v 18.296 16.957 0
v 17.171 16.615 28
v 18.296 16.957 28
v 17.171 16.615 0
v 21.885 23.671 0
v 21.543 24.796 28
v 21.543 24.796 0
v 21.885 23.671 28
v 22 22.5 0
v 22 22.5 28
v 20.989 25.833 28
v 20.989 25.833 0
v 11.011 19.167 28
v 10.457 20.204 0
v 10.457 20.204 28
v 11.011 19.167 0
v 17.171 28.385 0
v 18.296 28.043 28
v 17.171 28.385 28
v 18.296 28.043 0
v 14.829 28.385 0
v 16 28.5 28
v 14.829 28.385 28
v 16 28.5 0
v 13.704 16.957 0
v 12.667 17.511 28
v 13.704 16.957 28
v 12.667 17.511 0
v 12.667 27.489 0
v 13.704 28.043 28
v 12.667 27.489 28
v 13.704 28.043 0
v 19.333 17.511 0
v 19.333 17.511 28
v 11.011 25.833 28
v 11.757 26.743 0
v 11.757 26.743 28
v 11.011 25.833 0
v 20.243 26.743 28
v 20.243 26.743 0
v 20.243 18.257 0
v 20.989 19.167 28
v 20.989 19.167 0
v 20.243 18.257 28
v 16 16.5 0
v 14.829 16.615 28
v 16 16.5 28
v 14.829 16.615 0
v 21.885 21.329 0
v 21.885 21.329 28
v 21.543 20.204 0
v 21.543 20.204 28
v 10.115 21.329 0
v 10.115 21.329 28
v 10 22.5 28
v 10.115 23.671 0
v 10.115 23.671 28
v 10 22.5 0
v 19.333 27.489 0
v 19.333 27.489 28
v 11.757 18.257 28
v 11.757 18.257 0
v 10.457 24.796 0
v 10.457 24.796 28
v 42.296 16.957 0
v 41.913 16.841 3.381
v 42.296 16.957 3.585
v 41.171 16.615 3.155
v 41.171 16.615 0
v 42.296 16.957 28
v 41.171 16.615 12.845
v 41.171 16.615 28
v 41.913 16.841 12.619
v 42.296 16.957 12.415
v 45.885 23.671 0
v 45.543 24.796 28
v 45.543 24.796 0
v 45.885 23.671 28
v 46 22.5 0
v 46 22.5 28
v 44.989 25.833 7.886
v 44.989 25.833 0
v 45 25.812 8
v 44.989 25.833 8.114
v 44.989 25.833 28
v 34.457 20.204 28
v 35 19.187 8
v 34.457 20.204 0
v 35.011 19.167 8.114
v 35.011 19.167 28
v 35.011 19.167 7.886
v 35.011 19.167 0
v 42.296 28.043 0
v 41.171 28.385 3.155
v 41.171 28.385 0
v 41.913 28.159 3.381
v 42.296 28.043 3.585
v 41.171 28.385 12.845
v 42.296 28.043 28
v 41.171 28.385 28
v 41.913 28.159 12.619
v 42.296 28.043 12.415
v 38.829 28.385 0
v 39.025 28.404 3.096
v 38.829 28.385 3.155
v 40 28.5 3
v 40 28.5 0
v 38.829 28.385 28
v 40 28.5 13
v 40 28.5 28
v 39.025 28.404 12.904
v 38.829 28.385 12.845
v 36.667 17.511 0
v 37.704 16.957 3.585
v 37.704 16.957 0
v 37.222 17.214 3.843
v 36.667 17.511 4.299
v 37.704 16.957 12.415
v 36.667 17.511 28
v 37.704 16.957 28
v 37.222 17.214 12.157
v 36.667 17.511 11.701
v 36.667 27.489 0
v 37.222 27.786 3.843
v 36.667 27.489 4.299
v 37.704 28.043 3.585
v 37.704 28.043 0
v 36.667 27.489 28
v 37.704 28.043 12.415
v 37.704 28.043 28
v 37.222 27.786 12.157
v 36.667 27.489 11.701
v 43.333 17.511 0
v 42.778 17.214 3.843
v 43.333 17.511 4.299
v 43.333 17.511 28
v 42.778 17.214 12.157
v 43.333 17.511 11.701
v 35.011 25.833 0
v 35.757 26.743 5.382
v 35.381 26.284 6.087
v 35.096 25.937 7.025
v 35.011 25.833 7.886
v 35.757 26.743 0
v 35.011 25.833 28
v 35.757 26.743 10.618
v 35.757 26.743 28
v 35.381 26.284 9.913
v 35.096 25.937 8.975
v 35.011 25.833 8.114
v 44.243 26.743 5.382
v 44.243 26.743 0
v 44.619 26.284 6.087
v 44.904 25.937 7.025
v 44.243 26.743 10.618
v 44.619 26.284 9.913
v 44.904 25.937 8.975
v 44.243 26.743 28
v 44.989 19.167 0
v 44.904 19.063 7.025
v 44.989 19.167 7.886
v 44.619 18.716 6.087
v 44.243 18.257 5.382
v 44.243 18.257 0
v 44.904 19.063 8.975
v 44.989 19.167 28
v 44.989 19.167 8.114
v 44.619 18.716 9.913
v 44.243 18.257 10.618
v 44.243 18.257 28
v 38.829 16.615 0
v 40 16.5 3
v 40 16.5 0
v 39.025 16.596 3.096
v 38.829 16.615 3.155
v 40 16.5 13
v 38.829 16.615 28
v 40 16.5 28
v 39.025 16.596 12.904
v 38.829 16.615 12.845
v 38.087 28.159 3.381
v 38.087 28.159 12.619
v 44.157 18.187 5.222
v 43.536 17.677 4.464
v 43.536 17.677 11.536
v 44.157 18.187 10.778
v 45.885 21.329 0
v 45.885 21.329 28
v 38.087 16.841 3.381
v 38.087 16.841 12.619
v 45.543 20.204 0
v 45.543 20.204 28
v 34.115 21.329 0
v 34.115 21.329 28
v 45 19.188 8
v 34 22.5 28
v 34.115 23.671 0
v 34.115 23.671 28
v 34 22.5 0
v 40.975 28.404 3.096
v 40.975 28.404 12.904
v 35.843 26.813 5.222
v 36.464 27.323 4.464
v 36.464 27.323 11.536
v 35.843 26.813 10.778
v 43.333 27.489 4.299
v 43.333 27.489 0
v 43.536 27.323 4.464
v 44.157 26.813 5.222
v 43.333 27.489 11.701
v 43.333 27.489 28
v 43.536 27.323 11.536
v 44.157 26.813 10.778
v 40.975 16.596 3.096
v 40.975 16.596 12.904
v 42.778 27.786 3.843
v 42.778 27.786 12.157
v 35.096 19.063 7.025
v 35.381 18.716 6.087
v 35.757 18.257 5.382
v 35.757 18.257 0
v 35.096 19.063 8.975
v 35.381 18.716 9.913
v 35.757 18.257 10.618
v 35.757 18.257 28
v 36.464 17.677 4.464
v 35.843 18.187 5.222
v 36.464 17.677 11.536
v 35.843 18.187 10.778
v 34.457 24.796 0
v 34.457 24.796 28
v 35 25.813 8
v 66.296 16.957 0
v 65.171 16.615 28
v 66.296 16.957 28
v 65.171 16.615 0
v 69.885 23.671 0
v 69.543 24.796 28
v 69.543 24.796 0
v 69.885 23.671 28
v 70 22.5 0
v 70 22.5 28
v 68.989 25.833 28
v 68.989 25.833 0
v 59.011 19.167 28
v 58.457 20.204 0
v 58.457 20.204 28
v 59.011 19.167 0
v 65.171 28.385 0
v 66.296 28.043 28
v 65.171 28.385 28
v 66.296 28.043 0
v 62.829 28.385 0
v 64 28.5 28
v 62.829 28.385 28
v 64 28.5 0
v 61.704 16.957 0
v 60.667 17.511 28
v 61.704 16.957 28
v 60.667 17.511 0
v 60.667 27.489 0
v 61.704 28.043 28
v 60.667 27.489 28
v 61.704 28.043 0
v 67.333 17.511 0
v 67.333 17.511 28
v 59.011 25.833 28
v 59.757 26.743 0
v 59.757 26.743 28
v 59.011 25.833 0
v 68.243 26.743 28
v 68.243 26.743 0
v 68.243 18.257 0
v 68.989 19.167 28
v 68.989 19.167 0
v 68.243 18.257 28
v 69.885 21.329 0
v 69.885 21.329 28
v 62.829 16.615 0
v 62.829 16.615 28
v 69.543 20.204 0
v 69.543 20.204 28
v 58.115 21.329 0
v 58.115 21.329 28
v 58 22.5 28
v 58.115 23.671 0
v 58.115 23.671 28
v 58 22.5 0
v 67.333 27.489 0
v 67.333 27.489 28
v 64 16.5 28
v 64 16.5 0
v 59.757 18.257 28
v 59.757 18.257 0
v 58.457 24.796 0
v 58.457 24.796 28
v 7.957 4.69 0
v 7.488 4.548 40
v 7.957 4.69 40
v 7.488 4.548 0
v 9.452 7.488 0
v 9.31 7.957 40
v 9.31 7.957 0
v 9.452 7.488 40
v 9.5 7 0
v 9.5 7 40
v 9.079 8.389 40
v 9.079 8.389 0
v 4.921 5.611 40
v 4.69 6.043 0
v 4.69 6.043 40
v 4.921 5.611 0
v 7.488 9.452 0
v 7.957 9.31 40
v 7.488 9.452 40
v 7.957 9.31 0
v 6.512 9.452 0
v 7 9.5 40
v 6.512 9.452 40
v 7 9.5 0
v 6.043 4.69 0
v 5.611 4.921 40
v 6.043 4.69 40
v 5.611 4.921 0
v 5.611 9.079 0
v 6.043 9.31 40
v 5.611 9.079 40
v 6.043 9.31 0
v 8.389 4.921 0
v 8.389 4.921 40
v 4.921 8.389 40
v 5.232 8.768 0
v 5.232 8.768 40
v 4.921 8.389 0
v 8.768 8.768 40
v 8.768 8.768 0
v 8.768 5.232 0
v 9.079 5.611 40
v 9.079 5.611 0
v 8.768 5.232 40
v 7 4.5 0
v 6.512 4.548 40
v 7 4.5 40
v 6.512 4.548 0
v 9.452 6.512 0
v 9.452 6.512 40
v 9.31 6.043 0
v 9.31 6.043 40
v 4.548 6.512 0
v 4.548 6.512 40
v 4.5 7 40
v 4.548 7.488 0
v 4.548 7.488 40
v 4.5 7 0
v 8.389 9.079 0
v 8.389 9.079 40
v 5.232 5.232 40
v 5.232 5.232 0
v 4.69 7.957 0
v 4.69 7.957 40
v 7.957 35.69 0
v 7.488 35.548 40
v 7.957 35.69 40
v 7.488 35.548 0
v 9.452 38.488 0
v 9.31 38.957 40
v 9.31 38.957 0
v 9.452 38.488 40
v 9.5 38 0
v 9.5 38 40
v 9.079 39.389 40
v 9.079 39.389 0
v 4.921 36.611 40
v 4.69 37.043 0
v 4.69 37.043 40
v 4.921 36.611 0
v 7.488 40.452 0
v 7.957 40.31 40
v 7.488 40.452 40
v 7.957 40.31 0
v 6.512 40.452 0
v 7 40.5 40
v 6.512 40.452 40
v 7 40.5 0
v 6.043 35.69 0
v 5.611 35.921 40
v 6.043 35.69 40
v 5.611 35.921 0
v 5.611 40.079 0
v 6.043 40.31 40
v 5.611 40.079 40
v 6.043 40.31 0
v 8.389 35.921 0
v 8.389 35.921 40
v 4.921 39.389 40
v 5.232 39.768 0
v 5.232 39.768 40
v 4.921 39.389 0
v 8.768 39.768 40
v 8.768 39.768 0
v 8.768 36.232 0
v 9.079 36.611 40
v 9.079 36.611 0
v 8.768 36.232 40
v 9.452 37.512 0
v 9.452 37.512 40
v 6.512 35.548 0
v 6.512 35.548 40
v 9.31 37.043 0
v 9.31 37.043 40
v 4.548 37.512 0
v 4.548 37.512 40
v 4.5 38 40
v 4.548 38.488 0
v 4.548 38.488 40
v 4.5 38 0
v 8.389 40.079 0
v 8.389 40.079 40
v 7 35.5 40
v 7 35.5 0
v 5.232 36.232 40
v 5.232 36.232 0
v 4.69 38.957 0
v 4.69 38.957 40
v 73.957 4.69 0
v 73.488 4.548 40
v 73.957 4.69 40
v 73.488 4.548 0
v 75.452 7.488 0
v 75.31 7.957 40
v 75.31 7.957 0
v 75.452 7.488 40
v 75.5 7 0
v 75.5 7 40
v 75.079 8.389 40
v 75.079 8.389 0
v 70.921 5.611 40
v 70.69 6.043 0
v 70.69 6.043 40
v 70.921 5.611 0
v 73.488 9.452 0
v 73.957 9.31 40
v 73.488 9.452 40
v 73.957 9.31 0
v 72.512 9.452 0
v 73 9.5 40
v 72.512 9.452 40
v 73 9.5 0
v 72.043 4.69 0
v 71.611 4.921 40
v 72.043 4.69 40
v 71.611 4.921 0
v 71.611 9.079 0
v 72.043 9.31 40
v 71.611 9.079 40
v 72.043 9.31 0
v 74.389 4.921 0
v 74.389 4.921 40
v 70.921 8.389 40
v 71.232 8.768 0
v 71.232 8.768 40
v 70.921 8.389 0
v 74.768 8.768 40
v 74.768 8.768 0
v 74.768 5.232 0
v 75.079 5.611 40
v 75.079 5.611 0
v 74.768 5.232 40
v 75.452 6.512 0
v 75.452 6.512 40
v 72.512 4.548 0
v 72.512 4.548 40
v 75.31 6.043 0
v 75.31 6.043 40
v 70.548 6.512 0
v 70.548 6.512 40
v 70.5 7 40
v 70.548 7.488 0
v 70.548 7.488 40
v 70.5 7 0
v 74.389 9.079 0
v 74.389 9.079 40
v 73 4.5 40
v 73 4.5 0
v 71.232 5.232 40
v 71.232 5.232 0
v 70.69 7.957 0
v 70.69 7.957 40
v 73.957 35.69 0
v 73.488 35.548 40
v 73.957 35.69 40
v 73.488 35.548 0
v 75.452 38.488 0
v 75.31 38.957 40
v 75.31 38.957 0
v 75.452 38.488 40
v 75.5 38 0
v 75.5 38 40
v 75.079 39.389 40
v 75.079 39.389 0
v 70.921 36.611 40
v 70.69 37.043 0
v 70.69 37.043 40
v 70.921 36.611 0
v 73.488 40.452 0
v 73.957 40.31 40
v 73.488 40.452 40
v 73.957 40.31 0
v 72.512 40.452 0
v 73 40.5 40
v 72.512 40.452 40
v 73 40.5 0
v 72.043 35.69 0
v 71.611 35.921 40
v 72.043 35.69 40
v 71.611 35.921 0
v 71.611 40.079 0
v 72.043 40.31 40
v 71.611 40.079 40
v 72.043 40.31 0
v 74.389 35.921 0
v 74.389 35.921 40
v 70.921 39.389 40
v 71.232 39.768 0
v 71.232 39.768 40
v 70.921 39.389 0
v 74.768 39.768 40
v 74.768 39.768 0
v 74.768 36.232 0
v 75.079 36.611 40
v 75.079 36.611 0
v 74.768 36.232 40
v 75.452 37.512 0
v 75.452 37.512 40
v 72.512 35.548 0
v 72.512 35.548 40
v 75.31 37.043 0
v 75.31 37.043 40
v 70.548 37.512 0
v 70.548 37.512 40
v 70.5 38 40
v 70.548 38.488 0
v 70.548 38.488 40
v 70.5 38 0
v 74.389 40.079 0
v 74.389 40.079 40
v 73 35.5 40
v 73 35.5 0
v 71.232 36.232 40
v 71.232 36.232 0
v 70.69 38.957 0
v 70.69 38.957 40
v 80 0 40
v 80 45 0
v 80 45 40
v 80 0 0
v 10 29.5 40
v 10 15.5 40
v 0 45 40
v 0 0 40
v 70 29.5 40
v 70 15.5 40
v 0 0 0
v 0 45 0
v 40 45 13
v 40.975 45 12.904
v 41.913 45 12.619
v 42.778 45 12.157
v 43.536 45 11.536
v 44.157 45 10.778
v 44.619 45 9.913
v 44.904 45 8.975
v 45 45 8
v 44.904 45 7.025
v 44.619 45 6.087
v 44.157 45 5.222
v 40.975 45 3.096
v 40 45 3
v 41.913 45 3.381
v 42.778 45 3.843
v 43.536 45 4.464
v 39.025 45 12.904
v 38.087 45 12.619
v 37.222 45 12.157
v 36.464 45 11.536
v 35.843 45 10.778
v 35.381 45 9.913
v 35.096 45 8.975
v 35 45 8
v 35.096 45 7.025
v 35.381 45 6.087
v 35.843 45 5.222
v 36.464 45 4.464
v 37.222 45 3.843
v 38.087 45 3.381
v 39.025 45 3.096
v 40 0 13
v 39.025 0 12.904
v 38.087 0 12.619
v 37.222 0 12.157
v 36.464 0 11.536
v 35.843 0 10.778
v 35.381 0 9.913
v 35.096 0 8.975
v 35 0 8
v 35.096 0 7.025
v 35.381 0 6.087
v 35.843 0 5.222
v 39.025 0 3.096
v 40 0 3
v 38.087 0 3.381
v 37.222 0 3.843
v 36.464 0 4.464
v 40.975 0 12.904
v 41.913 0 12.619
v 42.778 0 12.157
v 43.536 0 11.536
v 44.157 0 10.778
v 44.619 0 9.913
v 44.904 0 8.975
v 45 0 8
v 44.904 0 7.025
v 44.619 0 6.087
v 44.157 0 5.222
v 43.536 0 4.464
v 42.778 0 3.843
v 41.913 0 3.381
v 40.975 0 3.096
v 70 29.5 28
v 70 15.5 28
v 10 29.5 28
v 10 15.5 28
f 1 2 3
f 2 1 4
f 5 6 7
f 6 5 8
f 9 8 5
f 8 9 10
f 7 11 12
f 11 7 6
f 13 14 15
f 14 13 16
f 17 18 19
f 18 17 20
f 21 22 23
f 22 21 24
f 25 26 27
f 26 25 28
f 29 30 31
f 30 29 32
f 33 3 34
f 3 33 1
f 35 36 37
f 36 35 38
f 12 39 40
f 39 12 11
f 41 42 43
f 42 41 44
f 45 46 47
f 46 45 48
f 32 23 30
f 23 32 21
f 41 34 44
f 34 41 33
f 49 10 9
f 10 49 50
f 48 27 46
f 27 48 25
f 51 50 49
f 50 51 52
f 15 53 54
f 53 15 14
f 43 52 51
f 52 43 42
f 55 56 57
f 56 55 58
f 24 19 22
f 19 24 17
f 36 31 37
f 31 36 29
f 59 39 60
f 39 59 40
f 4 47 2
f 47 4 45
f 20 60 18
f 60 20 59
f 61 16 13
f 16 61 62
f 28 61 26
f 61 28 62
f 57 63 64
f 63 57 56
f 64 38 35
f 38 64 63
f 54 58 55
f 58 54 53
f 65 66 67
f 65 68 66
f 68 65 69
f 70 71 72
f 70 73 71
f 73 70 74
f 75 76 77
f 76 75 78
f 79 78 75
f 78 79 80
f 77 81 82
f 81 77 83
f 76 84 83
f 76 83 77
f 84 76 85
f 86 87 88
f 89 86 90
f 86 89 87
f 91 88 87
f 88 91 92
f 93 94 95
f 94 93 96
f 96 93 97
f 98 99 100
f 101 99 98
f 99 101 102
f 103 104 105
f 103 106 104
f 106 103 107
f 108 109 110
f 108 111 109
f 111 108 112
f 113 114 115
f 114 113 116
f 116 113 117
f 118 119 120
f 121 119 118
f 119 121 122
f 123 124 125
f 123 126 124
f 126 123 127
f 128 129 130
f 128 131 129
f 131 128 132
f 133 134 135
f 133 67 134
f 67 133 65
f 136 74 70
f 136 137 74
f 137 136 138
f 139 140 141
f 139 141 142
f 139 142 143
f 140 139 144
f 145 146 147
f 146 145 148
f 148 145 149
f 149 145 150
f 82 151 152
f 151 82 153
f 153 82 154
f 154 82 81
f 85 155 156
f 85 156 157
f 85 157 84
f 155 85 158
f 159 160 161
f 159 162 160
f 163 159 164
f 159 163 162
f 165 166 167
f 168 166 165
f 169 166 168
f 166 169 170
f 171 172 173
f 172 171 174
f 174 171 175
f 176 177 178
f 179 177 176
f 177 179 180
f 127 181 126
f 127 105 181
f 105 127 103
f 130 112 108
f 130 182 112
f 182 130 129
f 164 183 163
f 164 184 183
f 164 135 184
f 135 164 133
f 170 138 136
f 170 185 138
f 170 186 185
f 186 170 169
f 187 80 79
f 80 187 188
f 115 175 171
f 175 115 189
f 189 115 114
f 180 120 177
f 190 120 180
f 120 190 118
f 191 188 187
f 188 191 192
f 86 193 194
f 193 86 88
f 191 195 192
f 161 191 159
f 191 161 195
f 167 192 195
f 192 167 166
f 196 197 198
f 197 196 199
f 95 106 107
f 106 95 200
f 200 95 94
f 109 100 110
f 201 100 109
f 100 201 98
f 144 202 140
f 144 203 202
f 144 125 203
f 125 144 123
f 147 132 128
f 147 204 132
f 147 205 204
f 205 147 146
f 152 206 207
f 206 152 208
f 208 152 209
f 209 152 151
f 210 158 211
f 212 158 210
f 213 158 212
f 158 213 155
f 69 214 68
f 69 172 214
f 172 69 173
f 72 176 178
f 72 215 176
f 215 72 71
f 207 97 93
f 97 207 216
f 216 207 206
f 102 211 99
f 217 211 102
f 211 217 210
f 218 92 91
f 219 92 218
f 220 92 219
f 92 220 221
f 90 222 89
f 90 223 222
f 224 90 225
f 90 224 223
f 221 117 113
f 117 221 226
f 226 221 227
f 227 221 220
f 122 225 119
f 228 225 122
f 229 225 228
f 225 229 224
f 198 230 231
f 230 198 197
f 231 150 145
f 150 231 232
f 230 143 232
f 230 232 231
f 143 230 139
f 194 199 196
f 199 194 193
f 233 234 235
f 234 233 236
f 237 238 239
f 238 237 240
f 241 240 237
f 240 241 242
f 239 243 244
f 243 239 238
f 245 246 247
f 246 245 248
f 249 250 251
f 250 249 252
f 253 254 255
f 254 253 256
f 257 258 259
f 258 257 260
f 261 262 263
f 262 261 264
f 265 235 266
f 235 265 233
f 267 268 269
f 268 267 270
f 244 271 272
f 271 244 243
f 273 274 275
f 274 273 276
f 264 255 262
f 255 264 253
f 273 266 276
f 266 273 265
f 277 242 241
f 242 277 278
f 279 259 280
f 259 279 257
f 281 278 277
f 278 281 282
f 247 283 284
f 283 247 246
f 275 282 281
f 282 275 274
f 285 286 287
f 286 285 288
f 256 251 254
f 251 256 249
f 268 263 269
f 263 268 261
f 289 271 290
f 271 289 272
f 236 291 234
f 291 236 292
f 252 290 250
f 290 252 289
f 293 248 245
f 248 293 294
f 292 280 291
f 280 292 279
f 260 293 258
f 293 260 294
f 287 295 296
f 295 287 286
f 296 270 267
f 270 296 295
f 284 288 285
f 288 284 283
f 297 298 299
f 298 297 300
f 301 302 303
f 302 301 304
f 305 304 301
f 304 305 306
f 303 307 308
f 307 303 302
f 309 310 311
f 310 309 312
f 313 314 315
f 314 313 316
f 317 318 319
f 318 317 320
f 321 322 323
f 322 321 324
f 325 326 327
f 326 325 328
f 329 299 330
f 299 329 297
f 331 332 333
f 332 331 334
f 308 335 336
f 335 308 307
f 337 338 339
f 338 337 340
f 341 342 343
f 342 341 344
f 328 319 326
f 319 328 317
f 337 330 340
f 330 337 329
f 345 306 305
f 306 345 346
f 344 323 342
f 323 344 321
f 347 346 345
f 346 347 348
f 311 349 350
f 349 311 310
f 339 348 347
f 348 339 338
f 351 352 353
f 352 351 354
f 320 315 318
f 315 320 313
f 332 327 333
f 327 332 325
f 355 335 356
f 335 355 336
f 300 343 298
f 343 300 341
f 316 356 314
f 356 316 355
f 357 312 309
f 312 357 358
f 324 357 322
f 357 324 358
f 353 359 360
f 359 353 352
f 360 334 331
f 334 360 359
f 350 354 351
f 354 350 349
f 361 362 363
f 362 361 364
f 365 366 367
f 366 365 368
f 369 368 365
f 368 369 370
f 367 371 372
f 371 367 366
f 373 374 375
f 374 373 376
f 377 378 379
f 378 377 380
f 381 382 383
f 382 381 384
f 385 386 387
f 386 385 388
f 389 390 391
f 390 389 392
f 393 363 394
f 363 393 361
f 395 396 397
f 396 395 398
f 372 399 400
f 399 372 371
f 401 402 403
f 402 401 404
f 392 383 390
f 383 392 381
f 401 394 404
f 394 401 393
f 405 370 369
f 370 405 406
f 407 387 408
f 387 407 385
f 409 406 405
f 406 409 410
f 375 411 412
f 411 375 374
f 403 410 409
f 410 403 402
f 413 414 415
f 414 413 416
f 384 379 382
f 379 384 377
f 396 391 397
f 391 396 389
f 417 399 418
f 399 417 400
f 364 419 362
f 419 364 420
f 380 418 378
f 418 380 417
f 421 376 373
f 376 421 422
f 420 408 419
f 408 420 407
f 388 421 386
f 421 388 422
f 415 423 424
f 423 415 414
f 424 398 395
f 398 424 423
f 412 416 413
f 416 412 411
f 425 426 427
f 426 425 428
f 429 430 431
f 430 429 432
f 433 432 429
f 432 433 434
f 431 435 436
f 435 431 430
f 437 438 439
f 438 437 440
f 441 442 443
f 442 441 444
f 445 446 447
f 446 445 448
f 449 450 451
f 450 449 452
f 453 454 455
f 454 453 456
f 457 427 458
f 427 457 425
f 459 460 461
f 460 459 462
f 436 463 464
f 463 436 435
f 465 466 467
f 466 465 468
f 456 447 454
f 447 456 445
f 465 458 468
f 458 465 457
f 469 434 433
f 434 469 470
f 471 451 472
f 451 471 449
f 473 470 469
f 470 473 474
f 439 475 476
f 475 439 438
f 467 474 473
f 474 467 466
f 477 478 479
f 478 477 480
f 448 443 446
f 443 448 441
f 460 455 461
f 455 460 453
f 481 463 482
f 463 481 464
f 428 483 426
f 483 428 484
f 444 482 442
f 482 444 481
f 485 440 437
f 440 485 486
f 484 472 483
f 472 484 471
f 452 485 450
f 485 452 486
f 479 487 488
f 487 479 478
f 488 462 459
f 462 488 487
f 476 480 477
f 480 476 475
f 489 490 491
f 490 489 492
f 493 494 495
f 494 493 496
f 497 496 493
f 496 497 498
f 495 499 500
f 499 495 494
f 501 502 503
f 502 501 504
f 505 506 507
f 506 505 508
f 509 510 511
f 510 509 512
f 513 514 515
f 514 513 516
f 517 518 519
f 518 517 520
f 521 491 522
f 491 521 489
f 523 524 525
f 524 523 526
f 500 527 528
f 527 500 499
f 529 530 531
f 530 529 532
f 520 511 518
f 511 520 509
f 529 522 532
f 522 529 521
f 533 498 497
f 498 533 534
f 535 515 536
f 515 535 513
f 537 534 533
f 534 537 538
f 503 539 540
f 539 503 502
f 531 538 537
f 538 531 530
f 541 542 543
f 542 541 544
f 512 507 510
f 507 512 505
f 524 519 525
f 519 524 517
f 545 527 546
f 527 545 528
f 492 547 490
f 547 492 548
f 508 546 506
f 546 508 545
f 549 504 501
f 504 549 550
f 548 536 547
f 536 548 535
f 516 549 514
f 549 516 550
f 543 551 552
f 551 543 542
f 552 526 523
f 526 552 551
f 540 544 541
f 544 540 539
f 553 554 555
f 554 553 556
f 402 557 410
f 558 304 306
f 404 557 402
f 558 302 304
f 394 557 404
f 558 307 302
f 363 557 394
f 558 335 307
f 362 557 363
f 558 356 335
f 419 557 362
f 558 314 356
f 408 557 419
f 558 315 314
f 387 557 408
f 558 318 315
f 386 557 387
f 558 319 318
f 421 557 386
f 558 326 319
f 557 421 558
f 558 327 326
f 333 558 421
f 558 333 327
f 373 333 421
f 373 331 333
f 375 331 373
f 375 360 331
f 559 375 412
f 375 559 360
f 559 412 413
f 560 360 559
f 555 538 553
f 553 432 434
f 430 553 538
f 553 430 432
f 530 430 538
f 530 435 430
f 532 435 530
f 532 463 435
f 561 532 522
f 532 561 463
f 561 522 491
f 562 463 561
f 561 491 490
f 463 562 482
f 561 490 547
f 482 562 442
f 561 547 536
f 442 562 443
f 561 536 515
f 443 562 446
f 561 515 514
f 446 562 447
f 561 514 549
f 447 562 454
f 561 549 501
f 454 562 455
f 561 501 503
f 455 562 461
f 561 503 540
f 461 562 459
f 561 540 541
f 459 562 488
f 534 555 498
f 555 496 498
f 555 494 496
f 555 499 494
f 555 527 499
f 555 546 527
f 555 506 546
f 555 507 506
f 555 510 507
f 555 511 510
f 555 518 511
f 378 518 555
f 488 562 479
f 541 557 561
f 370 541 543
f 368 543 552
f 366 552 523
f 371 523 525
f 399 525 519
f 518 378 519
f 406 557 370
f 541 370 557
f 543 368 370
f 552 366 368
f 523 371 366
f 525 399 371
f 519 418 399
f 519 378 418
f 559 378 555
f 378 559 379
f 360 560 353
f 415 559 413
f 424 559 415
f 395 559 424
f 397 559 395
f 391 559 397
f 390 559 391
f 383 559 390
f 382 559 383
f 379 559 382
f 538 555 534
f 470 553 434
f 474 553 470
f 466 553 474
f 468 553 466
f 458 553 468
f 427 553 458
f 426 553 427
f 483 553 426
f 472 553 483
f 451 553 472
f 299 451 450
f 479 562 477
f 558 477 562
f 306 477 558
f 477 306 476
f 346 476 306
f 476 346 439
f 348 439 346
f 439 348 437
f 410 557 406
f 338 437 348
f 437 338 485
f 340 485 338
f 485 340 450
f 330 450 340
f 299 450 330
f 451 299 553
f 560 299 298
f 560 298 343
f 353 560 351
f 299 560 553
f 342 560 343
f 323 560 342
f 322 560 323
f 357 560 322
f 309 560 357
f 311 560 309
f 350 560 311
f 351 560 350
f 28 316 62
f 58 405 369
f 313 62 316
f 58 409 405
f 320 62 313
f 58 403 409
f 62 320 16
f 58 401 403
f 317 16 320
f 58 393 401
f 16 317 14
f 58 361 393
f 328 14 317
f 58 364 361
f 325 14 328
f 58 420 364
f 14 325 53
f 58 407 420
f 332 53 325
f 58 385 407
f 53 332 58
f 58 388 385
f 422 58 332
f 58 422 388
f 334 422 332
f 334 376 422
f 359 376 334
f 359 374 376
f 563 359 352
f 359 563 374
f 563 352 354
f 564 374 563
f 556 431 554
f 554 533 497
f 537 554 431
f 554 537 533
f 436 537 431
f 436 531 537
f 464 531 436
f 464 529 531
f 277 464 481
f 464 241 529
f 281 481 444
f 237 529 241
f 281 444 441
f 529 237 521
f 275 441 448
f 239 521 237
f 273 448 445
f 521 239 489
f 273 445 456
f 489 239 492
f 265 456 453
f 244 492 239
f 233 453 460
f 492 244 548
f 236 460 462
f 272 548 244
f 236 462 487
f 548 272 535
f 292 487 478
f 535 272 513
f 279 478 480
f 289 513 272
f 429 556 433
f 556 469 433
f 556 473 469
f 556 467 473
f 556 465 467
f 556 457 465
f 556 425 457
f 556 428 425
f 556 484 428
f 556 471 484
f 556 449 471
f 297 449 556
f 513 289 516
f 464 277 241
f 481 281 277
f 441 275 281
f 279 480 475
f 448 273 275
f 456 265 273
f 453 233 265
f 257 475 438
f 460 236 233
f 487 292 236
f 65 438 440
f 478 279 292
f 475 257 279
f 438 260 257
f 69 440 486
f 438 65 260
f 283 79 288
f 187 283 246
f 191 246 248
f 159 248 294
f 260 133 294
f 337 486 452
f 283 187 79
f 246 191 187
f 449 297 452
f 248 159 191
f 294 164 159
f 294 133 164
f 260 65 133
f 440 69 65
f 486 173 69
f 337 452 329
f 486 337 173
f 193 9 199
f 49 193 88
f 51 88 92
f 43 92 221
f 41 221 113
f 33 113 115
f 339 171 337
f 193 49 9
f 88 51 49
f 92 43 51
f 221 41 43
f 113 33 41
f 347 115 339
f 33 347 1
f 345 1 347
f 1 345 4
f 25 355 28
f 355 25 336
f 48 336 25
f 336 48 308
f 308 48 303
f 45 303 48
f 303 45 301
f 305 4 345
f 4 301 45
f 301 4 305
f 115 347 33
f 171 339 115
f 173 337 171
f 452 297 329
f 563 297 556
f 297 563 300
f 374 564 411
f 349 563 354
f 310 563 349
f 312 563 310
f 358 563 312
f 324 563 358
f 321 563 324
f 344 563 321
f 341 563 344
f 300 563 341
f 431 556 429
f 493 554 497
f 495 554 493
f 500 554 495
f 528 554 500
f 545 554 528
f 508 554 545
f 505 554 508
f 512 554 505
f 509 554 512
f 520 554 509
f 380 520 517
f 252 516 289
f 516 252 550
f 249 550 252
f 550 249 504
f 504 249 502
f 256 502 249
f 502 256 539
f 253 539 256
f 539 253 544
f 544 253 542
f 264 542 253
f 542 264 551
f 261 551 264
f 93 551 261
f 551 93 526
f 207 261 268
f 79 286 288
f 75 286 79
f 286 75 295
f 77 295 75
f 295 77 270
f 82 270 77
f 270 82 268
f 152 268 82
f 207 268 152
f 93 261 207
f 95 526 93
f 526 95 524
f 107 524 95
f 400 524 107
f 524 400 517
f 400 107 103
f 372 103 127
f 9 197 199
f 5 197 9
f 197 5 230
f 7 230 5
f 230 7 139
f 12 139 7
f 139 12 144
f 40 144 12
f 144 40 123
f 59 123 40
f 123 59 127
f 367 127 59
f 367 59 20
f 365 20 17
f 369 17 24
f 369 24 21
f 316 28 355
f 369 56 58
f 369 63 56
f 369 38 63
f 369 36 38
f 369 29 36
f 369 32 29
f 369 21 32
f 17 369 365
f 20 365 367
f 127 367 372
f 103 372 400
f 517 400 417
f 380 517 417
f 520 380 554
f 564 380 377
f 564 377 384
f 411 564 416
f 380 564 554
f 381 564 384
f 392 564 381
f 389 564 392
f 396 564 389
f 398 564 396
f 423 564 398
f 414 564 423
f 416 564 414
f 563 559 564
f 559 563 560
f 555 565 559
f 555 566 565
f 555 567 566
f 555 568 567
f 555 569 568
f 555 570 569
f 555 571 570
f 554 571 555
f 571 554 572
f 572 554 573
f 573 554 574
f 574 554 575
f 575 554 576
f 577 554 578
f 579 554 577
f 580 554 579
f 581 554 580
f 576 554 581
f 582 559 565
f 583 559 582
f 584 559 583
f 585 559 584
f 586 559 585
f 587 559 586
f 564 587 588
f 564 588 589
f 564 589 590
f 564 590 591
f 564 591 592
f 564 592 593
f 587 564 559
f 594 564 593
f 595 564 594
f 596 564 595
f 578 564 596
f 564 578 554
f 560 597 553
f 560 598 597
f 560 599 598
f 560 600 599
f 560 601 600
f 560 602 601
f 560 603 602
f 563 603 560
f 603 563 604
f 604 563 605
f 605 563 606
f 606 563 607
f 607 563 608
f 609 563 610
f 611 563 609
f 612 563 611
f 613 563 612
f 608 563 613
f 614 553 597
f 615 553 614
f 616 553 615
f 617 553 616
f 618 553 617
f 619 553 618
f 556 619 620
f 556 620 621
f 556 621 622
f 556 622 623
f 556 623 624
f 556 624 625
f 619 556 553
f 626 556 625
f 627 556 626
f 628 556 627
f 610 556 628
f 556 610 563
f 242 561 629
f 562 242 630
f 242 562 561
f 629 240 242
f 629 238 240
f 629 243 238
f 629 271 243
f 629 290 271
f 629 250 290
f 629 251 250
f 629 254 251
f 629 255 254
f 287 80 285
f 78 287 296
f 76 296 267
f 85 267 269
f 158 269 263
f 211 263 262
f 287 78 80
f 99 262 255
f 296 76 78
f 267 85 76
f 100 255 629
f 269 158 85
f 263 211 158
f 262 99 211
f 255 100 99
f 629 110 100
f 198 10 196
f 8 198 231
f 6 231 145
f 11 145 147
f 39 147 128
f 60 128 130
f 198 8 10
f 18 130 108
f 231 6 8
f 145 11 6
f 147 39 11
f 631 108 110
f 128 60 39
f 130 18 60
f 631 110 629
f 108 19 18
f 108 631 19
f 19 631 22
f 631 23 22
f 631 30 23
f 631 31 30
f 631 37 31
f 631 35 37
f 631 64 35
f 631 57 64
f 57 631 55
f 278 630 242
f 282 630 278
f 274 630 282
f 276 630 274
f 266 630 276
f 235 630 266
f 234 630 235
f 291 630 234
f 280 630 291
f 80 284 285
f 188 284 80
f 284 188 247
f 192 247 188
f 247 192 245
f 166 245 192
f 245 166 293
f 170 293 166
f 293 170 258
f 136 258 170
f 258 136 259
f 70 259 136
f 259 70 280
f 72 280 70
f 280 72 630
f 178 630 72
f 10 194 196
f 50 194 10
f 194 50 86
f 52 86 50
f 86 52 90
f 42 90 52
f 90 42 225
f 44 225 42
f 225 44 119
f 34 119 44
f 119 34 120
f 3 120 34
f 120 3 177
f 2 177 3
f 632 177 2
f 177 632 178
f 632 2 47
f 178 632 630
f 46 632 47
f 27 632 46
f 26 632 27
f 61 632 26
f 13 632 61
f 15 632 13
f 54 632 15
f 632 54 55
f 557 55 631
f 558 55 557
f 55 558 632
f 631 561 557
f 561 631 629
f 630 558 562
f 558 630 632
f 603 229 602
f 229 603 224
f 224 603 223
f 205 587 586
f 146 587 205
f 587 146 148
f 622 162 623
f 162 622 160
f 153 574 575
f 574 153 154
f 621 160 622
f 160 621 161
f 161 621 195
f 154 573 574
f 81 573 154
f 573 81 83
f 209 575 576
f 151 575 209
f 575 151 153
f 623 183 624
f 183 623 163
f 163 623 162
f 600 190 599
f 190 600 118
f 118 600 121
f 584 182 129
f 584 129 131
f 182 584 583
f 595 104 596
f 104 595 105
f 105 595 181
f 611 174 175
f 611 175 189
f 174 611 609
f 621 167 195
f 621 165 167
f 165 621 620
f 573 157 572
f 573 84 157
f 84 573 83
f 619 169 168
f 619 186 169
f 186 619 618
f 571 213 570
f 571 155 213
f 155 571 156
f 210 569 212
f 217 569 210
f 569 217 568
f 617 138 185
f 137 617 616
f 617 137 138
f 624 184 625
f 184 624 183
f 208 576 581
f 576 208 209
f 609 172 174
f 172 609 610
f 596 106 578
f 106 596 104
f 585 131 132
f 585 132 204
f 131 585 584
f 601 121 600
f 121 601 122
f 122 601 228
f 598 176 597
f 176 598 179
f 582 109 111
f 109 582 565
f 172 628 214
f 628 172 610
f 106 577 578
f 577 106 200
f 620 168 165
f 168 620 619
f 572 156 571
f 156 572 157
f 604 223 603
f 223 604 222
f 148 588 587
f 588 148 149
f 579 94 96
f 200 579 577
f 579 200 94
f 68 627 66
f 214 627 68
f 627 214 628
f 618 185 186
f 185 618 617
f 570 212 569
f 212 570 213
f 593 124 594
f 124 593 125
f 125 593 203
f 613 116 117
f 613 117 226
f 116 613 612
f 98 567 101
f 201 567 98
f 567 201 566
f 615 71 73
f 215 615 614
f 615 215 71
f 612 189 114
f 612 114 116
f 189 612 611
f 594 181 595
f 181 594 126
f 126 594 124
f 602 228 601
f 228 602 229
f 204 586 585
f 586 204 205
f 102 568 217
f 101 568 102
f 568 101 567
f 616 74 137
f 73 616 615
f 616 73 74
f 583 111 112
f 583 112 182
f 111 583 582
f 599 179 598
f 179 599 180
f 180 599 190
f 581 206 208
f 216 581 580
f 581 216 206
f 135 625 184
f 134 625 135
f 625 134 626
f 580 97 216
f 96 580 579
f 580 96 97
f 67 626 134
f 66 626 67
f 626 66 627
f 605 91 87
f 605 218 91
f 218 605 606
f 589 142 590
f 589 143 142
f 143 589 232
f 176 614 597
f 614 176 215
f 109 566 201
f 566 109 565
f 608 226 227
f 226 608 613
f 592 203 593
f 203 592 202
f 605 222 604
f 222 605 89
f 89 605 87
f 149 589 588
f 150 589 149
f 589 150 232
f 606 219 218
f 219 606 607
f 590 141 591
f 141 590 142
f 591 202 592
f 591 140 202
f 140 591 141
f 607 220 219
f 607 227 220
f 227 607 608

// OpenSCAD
$fn = 32;

// ----------------------------------------------------------------------
// Manifold block: side_outlet manifold
// ----------------------------------------------------------------------

// --- parameters (mm) ---
block_l = 80;             // block length, X
block_w = 45;             // block width, Y
block_h = 40;             // block height, Z
port_d = 12;              // port bore diameter
port_pitch = 24;          // port pitch along X
gallery_d = 14;           // top gallery width, Y
gallery_depth = 12;       // gallery pocket depth
wall_p = 10;              // gallery end wall thickness, X
mnt_d = 5;                // mounting hole diameter
mnt_in = 7;               // mounting hole inset from the edges
out_d = 10;               // outlet bore diameter
out_z = 8;                // outlet axis height

n_ports = 3;  // ports in the row
port_x0 = (block_l - (n_ports - 1) * port_pitch) / 2;  // first port X

difference() {
  cube([block_l, block_w, block_h]);
  for (i = [0 : n_ports - 1])
    translate([port_x0 + i * port_pitch, block_w / 2, -1])
      cylinder(h = block_h + 2, d = port_d);
  translate([wall_p, block_w / 2 - gallery_d / 2, block_h - gallery_depth])
    cube([block_l - 2 * wall_p, gallery_d, gallery_depth + 1]);
  for (cx = [mnt_in, block_l - mnt_in])
    for (cy = [mnt_in, block_w - mnt_in])
      translate([cx, cy, -1]) cylinder(h = block_h + 2, d = mnt_d);
  translate([block_l / 2, -1, out_z]) rotate([-90, 0, 0])
    cylinder(h = block_w + 2, d = out_d);
}
